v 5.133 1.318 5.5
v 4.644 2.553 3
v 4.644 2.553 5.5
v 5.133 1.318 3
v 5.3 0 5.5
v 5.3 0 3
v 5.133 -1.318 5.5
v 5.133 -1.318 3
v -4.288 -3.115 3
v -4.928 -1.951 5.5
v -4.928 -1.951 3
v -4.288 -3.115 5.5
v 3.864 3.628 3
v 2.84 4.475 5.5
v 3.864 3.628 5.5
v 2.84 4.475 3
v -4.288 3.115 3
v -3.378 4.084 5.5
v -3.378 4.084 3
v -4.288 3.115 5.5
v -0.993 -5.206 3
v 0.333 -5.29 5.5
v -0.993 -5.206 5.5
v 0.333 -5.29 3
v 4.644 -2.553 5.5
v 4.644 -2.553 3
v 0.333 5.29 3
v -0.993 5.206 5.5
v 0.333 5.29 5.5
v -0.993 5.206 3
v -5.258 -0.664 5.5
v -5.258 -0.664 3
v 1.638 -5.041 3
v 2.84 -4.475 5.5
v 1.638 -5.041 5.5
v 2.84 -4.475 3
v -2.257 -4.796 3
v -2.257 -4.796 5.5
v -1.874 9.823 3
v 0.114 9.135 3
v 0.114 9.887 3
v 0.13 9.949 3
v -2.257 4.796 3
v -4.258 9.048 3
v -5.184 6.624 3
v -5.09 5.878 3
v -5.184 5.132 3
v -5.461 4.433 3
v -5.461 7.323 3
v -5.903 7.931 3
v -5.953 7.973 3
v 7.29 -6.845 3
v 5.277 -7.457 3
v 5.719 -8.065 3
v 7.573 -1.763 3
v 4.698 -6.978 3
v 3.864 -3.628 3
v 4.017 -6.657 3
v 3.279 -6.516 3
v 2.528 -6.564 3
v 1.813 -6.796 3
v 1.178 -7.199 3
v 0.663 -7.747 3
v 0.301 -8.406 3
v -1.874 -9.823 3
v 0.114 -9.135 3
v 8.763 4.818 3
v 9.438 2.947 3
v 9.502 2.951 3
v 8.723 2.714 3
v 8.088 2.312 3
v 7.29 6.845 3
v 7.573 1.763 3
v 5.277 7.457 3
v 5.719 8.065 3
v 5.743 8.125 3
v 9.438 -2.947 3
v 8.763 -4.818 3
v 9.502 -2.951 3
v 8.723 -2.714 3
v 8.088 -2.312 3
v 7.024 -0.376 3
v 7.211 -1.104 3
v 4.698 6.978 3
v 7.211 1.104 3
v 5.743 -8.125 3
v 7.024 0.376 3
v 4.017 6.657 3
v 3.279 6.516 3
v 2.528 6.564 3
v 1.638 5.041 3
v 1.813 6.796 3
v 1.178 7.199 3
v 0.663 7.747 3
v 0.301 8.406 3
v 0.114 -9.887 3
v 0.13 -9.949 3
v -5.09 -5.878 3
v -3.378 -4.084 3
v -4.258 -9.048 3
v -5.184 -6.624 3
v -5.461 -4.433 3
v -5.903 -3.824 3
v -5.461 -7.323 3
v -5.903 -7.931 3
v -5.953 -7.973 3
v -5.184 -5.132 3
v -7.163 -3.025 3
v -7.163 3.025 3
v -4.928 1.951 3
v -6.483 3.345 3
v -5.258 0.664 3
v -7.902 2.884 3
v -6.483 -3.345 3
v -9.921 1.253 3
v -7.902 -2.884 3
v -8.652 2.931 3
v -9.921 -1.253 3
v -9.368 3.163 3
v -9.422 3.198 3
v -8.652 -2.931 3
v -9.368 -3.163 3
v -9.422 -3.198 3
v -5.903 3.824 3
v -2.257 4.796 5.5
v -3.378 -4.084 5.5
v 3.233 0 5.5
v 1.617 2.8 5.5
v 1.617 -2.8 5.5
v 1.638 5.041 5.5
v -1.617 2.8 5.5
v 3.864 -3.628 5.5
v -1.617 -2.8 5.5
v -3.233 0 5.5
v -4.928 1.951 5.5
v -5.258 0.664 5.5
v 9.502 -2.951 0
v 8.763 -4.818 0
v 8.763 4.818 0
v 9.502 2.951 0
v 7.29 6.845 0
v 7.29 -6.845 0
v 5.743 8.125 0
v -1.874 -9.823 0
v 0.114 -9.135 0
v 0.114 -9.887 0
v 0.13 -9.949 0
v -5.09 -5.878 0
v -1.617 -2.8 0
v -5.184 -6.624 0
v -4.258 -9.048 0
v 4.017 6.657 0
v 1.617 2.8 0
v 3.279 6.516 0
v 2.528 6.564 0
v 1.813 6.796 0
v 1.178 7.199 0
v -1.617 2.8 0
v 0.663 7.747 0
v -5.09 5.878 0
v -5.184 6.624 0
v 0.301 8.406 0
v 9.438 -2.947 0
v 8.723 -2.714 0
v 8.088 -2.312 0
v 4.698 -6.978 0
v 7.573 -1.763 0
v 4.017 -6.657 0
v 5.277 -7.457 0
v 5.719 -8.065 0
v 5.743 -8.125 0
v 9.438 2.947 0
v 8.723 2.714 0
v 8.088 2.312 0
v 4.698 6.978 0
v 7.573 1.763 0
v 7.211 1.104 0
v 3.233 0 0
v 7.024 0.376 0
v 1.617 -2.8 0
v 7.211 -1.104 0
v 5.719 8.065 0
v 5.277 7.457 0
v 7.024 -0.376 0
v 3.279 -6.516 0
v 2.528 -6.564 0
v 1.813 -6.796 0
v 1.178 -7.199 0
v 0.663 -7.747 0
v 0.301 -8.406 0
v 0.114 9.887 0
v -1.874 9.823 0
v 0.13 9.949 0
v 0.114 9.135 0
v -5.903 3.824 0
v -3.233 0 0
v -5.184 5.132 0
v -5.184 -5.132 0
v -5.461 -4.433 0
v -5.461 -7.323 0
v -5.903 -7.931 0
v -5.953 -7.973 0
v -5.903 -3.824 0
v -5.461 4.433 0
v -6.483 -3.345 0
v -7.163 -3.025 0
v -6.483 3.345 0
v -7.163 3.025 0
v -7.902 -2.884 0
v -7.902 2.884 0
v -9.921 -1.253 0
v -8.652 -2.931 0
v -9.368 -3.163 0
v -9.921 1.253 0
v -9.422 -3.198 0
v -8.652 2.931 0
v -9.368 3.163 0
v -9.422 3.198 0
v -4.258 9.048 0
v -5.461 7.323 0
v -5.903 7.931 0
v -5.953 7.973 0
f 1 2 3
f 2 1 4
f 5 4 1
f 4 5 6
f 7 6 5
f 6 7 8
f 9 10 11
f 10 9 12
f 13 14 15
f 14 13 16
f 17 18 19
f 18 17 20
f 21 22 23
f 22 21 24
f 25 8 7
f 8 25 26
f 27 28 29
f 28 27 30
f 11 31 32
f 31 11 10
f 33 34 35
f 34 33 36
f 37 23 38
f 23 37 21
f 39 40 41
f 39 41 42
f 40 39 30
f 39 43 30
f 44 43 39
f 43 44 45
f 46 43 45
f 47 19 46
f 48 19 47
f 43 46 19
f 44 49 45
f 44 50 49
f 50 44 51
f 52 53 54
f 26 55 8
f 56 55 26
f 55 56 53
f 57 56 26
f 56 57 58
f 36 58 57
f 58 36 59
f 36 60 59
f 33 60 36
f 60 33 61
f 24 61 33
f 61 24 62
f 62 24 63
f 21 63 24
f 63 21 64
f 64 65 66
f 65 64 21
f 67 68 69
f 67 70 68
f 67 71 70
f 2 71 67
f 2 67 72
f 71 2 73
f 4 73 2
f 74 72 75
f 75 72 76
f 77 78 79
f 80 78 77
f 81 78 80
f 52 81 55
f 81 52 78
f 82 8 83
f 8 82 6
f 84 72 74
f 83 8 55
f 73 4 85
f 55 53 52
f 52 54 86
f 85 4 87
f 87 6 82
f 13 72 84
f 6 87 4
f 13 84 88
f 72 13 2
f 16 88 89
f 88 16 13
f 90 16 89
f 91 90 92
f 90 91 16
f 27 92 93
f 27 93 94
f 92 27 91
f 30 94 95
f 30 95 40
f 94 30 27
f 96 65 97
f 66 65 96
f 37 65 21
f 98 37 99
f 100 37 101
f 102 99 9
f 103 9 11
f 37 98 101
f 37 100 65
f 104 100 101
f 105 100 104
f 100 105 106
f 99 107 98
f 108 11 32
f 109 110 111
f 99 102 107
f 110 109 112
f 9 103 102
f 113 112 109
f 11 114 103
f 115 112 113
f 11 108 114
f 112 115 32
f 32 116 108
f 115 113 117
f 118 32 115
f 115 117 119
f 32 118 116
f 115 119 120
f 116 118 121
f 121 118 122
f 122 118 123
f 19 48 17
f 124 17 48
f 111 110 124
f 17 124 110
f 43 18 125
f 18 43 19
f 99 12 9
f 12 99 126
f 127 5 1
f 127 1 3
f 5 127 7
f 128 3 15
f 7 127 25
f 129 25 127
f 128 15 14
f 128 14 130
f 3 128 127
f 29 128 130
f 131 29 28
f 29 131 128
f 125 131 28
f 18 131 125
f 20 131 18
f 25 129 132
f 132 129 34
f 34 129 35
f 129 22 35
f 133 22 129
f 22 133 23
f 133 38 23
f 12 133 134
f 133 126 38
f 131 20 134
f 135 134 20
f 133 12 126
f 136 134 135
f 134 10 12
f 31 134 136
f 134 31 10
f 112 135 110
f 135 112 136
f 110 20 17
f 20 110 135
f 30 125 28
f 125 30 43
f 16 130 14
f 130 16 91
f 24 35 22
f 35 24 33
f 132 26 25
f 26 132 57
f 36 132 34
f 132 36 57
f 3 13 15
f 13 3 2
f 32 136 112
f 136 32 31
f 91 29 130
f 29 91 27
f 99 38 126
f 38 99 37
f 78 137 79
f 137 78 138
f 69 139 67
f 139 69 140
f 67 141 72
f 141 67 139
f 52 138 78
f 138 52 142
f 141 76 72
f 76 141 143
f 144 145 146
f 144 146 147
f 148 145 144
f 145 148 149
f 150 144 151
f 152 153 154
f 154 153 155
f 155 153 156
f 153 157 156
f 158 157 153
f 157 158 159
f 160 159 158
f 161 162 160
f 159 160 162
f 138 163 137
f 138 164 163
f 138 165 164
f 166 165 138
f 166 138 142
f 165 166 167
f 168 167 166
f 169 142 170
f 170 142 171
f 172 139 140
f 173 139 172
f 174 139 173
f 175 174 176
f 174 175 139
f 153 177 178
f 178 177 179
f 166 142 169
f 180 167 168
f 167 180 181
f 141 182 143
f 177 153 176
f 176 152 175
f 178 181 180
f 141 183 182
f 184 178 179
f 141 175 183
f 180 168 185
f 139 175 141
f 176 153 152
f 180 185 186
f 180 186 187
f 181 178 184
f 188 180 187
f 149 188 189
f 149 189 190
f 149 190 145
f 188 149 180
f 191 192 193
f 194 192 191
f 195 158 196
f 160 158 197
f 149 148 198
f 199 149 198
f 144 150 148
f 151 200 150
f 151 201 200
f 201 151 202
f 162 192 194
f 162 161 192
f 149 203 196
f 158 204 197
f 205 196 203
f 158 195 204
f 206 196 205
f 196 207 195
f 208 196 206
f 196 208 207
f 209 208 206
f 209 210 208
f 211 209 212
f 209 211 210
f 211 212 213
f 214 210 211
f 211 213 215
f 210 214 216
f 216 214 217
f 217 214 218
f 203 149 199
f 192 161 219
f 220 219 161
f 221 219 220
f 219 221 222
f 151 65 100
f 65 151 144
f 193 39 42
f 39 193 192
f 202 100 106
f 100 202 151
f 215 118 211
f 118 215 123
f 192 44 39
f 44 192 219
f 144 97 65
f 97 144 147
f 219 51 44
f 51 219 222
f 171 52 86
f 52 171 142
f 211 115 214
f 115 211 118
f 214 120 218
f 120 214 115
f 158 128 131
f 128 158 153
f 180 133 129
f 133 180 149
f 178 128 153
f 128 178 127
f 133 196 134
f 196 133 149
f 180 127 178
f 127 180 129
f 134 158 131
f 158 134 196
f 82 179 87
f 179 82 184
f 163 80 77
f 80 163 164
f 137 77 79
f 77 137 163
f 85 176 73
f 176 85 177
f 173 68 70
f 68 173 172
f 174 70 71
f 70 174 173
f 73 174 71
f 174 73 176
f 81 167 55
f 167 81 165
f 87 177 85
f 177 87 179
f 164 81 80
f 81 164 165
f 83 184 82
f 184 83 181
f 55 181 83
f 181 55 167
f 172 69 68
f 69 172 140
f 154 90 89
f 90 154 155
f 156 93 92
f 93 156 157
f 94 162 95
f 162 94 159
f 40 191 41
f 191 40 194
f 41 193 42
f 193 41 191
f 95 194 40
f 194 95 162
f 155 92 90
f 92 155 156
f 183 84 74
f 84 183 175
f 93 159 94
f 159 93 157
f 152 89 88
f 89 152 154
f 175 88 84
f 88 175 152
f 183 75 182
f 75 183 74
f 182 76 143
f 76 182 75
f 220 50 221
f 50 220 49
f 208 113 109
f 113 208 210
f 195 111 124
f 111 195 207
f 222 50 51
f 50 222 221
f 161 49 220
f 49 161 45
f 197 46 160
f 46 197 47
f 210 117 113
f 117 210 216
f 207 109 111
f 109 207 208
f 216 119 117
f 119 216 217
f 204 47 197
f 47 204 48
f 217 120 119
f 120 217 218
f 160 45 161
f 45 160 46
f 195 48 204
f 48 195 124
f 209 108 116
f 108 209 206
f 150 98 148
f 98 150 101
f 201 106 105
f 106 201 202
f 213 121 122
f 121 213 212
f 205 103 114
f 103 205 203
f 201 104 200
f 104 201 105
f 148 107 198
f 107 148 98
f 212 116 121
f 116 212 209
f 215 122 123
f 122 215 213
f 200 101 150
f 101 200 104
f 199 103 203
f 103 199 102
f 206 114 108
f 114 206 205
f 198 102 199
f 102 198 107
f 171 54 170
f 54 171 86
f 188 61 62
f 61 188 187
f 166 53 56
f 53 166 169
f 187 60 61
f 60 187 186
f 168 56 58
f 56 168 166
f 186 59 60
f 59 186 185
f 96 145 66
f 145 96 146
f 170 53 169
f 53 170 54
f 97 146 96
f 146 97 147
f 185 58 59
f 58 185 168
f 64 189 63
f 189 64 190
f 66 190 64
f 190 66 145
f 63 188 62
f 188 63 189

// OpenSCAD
/*
 * Created by:
 * Thomas Buck <xythobuz@xythobuz.de> in April 2016
 *
 * Licensed under the Creative Commons - Attribution license.
 */

// M2: 4; M3: 5.5; M4: 7; M5: 8
nut_size = 5.5; // [1:50]
nut_height = 2.5; // [0:50]
base_size = 20; // [1:50]
base_height = 3; // [1:50]
wall_size = 2.5; // [1:50]
cut_out_factor = 0.3; // [0.0:1.0]
cut_out_count = 5; // [0:10]
nut_size_buffer = 0.1; // [0.0:1.0]

// -----------------------------------------------------------

$fn = 25;
hexagon_size = (nut_size + nut_size_buffer);

// -----------------------------------------------------------

module hexagon(w = 1, h = 1) {
    hw = w / sqrt(3);
    for (i = [0 : 120 : 360]) {
        rotate([0, 0, i])
            translate([-hw / 2, -w / 2, 0])
            cube([hw, w, h]);
    }
}

// -----------------------------------------------------------

difference() {
    union() {
        // shaft
        translate([0, 0, base_height])
            cylinder(d = hexagon_size + (wall_size * 2), h = nut_height);
        
        // base
        cylinder(d = base_size, h = base_height);
    }
    
    // cut out for nut
    hexagon(w = hexagon_size, h = base_height + nut_height);
    
    // cut outs for fingers
    for (i = [0 : cut_out_count]) {
        rotate([0, 0, (360 / cut_out_count) * i])
            translate([(base_size / 2), 0, 0])
            cylinder(d = base_size * cut_out_factor, h = base_height);
    }
}
